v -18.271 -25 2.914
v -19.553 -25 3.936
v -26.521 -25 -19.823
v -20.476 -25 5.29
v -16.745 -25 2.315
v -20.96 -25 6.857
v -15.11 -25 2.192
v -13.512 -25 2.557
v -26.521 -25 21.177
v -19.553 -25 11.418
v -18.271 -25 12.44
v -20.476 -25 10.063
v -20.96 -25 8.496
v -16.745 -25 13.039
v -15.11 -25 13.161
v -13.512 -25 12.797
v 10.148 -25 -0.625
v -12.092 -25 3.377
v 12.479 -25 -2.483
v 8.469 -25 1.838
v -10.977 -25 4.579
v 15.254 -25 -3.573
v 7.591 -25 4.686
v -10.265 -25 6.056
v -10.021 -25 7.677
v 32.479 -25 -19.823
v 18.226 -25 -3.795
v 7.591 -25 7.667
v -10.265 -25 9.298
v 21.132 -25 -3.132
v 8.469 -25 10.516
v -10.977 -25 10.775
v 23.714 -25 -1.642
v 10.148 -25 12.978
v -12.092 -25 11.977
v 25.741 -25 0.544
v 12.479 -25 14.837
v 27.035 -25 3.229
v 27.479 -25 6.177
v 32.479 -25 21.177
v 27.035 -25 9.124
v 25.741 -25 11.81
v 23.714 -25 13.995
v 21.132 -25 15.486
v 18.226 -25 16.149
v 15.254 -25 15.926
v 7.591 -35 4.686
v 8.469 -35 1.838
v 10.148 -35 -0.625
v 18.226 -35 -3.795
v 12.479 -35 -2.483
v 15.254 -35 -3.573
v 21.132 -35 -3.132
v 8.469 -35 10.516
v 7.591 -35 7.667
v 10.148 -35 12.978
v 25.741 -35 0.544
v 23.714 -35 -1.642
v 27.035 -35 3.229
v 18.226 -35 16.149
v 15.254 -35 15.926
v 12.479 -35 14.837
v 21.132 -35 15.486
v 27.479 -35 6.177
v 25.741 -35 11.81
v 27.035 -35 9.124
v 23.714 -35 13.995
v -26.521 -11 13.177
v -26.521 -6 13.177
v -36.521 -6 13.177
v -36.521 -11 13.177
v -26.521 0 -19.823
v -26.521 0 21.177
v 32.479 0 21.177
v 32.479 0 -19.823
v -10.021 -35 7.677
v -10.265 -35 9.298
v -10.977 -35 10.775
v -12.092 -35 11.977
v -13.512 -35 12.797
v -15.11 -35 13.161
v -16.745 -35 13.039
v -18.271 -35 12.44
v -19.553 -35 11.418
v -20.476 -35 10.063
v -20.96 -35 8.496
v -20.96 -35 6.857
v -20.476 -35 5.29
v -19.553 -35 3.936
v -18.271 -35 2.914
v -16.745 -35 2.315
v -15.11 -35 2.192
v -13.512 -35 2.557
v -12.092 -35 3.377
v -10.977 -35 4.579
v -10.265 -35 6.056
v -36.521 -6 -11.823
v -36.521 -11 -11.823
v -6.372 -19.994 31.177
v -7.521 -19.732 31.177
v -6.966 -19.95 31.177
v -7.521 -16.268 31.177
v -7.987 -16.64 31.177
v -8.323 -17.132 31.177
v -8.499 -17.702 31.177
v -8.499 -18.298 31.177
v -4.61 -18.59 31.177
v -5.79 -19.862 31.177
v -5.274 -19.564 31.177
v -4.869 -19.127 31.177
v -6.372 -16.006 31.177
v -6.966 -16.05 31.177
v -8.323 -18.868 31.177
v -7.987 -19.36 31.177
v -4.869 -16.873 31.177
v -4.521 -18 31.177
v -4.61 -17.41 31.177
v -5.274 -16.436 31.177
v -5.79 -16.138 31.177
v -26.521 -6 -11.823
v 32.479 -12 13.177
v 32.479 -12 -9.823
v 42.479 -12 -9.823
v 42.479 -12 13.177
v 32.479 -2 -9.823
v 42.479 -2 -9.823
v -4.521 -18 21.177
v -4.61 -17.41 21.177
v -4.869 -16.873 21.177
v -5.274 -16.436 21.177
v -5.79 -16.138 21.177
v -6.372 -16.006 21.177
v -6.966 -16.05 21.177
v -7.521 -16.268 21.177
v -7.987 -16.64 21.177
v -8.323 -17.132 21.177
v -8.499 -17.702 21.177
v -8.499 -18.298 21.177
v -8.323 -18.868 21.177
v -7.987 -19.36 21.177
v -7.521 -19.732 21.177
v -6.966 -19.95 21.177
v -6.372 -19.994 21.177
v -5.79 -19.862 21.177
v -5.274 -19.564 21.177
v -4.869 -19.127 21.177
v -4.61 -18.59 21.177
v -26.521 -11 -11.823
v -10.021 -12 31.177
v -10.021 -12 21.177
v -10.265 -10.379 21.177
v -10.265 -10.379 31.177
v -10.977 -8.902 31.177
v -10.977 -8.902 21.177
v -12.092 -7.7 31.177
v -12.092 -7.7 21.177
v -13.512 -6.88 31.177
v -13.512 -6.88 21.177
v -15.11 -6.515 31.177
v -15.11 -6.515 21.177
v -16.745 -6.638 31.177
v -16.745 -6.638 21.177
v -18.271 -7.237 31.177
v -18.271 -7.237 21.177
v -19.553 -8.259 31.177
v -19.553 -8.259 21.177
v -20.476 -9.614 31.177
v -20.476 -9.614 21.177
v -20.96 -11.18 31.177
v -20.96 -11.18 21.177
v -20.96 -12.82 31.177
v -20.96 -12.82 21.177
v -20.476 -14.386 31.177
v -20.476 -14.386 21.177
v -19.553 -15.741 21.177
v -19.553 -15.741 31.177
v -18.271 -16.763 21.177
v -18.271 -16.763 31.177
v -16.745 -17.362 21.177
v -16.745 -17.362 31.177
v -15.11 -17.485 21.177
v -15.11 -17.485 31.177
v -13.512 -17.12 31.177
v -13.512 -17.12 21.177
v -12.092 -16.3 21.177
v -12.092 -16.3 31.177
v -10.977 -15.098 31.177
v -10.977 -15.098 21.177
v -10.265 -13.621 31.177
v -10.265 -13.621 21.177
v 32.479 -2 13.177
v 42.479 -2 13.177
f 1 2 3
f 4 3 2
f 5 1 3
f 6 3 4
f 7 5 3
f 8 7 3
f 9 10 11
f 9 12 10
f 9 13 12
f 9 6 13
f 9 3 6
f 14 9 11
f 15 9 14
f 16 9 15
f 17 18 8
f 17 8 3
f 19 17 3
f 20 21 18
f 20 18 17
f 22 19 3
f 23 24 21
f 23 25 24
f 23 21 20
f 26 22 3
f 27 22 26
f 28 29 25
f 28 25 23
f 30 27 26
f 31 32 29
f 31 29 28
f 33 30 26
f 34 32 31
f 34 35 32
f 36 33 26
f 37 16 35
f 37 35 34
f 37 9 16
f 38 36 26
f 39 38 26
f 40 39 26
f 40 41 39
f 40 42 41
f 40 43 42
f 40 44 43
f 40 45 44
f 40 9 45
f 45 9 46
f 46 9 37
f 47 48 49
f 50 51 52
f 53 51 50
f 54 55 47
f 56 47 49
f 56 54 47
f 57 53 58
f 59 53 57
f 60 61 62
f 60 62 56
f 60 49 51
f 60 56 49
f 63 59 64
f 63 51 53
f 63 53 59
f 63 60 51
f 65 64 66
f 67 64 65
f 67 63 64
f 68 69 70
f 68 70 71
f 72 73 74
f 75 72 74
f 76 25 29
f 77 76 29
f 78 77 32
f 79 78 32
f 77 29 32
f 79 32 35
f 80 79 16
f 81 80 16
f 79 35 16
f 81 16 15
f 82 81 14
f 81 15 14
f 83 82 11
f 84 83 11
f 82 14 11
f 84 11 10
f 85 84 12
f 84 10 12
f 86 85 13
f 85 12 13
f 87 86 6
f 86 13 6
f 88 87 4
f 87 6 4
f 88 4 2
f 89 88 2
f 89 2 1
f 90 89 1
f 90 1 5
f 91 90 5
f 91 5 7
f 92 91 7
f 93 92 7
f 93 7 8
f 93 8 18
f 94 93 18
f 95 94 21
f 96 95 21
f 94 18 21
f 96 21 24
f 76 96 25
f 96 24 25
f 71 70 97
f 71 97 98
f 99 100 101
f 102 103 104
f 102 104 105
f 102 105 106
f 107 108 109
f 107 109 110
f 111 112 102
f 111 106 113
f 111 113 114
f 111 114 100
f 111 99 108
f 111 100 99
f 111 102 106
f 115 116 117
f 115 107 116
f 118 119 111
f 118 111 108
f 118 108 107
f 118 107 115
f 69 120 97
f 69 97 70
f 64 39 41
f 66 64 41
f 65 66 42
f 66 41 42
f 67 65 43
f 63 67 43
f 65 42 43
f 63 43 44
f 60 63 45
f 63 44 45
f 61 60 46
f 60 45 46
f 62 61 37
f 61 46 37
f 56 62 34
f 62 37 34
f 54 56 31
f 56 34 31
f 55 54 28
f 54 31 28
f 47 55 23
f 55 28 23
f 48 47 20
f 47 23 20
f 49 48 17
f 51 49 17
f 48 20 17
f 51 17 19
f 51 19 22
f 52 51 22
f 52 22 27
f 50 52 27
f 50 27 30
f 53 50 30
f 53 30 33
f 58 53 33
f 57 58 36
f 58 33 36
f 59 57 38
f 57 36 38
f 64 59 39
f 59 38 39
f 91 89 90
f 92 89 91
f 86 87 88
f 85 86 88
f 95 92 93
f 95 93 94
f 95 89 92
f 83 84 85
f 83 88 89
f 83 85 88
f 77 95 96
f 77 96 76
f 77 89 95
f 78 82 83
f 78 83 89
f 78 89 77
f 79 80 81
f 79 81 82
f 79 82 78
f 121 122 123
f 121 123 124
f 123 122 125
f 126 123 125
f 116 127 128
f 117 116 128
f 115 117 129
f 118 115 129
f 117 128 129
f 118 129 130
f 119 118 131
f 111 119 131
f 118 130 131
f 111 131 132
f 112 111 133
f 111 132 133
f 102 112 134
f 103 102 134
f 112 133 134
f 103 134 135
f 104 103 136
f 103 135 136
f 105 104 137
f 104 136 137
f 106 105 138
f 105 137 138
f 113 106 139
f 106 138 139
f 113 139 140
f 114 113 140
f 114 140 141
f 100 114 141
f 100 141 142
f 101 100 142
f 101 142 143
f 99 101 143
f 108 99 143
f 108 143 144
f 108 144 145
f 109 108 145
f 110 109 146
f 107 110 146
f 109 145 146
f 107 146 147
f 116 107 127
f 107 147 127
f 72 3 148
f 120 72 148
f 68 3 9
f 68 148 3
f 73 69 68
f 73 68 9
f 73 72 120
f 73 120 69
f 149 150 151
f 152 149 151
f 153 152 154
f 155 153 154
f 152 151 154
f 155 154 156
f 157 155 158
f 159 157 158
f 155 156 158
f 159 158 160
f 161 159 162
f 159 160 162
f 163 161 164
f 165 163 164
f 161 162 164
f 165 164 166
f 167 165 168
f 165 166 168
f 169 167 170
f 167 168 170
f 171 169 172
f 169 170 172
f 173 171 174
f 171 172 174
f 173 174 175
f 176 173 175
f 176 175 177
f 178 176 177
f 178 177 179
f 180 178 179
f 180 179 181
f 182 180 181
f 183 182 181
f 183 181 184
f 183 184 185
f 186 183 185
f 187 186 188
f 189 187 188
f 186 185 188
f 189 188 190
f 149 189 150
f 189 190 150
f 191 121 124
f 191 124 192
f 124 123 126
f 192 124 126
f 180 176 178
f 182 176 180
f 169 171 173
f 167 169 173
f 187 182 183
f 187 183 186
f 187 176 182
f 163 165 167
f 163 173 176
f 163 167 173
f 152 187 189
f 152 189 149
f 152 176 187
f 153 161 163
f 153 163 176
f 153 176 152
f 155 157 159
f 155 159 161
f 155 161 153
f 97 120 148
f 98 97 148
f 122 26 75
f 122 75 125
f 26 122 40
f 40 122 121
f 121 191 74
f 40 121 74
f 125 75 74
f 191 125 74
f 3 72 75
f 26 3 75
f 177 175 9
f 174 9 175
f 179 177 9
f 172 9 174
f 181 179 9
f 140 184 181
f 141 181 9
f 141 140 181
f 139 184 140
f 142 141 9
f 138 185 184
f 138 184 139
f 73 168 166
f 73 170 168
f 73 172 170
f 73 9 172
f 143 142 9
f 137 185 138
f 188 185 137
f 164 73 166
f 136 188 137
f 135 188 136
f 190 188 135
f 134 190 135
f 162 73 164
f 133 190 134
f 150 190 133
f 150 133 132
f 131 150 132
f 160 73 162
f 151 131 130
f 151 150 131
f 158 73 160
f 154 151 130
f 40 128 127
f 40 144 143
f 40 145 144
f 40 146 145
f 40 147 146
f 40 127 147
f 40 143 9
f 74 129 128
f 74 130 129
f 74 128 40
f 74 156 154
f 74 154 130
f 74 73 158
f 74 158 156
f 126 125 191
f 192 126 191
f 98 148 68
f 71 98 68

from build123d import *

# Parameters (mm, degrees)
F0_W     = 59
F0_H     = 41
F1_DEPTH = 25
F2_R     = 5.5
F2_R_2   = 10
F3_DEPTH = 10
F4_R     = 2
F4_R_2   = 5.5
F5_DEPTH = 10
F6_W     = 10
F6_H     = 23
F7_DEPTH = 10
F8_W     = 5
F8_H     = 25
F9_DEPTH = 10


with BuildPart() as f1:
    # F0 (on Front) → F1 (new body)
    with BuildSketch(Plane.XZ):
        with Locations((2.978919, 0.676766)):
            Rectangle(F0_W, F0_H)
    extrude(amount=F1_DEPTH)

    # F2 (on face) → F3 (join)
    with BuildSketch(Plane.XZ.offset(25)):
        with Locations((-15.521081, 7.676766)):
            Circle(F2_R)
        with Locations((17.478919, 6.176766)):
            Circle(F2_R_2)
    extrude(amount=F3_DEPTH)

    # F4 (on face) → F5 (join)
    with BuildSketch(Plane.XY.offset(21.176766)):
        with Locations((-6.521081, -18)):
            Circle(F4_R)
        with Locations((-15.521081, -12)):
            Circle(F4_R_2)
    extrude(amount=F5_DEPTH)

    # F6 (on face) → F7 (join)
    with BuildSketch(Plane.YZ.offset(32.478919)):
        with Locations((-7, 1.676766)):
            Rectangle(F6_W, F6_H)
    extrude(amount=F7_DEPTH)

    # F8 (on face) → F9 (join)
    with BuildSketch(Plane(origin=(-26.521081, 0, 0), x_dir=(0, -1, 0), z_dir=(-1, 0, 0))):
        with Locations((8.5, 0.676766)):
            Rectangle(F8_W, F8_H)
    extrude(amount=F9_DEPTH)


solid = f1.part
